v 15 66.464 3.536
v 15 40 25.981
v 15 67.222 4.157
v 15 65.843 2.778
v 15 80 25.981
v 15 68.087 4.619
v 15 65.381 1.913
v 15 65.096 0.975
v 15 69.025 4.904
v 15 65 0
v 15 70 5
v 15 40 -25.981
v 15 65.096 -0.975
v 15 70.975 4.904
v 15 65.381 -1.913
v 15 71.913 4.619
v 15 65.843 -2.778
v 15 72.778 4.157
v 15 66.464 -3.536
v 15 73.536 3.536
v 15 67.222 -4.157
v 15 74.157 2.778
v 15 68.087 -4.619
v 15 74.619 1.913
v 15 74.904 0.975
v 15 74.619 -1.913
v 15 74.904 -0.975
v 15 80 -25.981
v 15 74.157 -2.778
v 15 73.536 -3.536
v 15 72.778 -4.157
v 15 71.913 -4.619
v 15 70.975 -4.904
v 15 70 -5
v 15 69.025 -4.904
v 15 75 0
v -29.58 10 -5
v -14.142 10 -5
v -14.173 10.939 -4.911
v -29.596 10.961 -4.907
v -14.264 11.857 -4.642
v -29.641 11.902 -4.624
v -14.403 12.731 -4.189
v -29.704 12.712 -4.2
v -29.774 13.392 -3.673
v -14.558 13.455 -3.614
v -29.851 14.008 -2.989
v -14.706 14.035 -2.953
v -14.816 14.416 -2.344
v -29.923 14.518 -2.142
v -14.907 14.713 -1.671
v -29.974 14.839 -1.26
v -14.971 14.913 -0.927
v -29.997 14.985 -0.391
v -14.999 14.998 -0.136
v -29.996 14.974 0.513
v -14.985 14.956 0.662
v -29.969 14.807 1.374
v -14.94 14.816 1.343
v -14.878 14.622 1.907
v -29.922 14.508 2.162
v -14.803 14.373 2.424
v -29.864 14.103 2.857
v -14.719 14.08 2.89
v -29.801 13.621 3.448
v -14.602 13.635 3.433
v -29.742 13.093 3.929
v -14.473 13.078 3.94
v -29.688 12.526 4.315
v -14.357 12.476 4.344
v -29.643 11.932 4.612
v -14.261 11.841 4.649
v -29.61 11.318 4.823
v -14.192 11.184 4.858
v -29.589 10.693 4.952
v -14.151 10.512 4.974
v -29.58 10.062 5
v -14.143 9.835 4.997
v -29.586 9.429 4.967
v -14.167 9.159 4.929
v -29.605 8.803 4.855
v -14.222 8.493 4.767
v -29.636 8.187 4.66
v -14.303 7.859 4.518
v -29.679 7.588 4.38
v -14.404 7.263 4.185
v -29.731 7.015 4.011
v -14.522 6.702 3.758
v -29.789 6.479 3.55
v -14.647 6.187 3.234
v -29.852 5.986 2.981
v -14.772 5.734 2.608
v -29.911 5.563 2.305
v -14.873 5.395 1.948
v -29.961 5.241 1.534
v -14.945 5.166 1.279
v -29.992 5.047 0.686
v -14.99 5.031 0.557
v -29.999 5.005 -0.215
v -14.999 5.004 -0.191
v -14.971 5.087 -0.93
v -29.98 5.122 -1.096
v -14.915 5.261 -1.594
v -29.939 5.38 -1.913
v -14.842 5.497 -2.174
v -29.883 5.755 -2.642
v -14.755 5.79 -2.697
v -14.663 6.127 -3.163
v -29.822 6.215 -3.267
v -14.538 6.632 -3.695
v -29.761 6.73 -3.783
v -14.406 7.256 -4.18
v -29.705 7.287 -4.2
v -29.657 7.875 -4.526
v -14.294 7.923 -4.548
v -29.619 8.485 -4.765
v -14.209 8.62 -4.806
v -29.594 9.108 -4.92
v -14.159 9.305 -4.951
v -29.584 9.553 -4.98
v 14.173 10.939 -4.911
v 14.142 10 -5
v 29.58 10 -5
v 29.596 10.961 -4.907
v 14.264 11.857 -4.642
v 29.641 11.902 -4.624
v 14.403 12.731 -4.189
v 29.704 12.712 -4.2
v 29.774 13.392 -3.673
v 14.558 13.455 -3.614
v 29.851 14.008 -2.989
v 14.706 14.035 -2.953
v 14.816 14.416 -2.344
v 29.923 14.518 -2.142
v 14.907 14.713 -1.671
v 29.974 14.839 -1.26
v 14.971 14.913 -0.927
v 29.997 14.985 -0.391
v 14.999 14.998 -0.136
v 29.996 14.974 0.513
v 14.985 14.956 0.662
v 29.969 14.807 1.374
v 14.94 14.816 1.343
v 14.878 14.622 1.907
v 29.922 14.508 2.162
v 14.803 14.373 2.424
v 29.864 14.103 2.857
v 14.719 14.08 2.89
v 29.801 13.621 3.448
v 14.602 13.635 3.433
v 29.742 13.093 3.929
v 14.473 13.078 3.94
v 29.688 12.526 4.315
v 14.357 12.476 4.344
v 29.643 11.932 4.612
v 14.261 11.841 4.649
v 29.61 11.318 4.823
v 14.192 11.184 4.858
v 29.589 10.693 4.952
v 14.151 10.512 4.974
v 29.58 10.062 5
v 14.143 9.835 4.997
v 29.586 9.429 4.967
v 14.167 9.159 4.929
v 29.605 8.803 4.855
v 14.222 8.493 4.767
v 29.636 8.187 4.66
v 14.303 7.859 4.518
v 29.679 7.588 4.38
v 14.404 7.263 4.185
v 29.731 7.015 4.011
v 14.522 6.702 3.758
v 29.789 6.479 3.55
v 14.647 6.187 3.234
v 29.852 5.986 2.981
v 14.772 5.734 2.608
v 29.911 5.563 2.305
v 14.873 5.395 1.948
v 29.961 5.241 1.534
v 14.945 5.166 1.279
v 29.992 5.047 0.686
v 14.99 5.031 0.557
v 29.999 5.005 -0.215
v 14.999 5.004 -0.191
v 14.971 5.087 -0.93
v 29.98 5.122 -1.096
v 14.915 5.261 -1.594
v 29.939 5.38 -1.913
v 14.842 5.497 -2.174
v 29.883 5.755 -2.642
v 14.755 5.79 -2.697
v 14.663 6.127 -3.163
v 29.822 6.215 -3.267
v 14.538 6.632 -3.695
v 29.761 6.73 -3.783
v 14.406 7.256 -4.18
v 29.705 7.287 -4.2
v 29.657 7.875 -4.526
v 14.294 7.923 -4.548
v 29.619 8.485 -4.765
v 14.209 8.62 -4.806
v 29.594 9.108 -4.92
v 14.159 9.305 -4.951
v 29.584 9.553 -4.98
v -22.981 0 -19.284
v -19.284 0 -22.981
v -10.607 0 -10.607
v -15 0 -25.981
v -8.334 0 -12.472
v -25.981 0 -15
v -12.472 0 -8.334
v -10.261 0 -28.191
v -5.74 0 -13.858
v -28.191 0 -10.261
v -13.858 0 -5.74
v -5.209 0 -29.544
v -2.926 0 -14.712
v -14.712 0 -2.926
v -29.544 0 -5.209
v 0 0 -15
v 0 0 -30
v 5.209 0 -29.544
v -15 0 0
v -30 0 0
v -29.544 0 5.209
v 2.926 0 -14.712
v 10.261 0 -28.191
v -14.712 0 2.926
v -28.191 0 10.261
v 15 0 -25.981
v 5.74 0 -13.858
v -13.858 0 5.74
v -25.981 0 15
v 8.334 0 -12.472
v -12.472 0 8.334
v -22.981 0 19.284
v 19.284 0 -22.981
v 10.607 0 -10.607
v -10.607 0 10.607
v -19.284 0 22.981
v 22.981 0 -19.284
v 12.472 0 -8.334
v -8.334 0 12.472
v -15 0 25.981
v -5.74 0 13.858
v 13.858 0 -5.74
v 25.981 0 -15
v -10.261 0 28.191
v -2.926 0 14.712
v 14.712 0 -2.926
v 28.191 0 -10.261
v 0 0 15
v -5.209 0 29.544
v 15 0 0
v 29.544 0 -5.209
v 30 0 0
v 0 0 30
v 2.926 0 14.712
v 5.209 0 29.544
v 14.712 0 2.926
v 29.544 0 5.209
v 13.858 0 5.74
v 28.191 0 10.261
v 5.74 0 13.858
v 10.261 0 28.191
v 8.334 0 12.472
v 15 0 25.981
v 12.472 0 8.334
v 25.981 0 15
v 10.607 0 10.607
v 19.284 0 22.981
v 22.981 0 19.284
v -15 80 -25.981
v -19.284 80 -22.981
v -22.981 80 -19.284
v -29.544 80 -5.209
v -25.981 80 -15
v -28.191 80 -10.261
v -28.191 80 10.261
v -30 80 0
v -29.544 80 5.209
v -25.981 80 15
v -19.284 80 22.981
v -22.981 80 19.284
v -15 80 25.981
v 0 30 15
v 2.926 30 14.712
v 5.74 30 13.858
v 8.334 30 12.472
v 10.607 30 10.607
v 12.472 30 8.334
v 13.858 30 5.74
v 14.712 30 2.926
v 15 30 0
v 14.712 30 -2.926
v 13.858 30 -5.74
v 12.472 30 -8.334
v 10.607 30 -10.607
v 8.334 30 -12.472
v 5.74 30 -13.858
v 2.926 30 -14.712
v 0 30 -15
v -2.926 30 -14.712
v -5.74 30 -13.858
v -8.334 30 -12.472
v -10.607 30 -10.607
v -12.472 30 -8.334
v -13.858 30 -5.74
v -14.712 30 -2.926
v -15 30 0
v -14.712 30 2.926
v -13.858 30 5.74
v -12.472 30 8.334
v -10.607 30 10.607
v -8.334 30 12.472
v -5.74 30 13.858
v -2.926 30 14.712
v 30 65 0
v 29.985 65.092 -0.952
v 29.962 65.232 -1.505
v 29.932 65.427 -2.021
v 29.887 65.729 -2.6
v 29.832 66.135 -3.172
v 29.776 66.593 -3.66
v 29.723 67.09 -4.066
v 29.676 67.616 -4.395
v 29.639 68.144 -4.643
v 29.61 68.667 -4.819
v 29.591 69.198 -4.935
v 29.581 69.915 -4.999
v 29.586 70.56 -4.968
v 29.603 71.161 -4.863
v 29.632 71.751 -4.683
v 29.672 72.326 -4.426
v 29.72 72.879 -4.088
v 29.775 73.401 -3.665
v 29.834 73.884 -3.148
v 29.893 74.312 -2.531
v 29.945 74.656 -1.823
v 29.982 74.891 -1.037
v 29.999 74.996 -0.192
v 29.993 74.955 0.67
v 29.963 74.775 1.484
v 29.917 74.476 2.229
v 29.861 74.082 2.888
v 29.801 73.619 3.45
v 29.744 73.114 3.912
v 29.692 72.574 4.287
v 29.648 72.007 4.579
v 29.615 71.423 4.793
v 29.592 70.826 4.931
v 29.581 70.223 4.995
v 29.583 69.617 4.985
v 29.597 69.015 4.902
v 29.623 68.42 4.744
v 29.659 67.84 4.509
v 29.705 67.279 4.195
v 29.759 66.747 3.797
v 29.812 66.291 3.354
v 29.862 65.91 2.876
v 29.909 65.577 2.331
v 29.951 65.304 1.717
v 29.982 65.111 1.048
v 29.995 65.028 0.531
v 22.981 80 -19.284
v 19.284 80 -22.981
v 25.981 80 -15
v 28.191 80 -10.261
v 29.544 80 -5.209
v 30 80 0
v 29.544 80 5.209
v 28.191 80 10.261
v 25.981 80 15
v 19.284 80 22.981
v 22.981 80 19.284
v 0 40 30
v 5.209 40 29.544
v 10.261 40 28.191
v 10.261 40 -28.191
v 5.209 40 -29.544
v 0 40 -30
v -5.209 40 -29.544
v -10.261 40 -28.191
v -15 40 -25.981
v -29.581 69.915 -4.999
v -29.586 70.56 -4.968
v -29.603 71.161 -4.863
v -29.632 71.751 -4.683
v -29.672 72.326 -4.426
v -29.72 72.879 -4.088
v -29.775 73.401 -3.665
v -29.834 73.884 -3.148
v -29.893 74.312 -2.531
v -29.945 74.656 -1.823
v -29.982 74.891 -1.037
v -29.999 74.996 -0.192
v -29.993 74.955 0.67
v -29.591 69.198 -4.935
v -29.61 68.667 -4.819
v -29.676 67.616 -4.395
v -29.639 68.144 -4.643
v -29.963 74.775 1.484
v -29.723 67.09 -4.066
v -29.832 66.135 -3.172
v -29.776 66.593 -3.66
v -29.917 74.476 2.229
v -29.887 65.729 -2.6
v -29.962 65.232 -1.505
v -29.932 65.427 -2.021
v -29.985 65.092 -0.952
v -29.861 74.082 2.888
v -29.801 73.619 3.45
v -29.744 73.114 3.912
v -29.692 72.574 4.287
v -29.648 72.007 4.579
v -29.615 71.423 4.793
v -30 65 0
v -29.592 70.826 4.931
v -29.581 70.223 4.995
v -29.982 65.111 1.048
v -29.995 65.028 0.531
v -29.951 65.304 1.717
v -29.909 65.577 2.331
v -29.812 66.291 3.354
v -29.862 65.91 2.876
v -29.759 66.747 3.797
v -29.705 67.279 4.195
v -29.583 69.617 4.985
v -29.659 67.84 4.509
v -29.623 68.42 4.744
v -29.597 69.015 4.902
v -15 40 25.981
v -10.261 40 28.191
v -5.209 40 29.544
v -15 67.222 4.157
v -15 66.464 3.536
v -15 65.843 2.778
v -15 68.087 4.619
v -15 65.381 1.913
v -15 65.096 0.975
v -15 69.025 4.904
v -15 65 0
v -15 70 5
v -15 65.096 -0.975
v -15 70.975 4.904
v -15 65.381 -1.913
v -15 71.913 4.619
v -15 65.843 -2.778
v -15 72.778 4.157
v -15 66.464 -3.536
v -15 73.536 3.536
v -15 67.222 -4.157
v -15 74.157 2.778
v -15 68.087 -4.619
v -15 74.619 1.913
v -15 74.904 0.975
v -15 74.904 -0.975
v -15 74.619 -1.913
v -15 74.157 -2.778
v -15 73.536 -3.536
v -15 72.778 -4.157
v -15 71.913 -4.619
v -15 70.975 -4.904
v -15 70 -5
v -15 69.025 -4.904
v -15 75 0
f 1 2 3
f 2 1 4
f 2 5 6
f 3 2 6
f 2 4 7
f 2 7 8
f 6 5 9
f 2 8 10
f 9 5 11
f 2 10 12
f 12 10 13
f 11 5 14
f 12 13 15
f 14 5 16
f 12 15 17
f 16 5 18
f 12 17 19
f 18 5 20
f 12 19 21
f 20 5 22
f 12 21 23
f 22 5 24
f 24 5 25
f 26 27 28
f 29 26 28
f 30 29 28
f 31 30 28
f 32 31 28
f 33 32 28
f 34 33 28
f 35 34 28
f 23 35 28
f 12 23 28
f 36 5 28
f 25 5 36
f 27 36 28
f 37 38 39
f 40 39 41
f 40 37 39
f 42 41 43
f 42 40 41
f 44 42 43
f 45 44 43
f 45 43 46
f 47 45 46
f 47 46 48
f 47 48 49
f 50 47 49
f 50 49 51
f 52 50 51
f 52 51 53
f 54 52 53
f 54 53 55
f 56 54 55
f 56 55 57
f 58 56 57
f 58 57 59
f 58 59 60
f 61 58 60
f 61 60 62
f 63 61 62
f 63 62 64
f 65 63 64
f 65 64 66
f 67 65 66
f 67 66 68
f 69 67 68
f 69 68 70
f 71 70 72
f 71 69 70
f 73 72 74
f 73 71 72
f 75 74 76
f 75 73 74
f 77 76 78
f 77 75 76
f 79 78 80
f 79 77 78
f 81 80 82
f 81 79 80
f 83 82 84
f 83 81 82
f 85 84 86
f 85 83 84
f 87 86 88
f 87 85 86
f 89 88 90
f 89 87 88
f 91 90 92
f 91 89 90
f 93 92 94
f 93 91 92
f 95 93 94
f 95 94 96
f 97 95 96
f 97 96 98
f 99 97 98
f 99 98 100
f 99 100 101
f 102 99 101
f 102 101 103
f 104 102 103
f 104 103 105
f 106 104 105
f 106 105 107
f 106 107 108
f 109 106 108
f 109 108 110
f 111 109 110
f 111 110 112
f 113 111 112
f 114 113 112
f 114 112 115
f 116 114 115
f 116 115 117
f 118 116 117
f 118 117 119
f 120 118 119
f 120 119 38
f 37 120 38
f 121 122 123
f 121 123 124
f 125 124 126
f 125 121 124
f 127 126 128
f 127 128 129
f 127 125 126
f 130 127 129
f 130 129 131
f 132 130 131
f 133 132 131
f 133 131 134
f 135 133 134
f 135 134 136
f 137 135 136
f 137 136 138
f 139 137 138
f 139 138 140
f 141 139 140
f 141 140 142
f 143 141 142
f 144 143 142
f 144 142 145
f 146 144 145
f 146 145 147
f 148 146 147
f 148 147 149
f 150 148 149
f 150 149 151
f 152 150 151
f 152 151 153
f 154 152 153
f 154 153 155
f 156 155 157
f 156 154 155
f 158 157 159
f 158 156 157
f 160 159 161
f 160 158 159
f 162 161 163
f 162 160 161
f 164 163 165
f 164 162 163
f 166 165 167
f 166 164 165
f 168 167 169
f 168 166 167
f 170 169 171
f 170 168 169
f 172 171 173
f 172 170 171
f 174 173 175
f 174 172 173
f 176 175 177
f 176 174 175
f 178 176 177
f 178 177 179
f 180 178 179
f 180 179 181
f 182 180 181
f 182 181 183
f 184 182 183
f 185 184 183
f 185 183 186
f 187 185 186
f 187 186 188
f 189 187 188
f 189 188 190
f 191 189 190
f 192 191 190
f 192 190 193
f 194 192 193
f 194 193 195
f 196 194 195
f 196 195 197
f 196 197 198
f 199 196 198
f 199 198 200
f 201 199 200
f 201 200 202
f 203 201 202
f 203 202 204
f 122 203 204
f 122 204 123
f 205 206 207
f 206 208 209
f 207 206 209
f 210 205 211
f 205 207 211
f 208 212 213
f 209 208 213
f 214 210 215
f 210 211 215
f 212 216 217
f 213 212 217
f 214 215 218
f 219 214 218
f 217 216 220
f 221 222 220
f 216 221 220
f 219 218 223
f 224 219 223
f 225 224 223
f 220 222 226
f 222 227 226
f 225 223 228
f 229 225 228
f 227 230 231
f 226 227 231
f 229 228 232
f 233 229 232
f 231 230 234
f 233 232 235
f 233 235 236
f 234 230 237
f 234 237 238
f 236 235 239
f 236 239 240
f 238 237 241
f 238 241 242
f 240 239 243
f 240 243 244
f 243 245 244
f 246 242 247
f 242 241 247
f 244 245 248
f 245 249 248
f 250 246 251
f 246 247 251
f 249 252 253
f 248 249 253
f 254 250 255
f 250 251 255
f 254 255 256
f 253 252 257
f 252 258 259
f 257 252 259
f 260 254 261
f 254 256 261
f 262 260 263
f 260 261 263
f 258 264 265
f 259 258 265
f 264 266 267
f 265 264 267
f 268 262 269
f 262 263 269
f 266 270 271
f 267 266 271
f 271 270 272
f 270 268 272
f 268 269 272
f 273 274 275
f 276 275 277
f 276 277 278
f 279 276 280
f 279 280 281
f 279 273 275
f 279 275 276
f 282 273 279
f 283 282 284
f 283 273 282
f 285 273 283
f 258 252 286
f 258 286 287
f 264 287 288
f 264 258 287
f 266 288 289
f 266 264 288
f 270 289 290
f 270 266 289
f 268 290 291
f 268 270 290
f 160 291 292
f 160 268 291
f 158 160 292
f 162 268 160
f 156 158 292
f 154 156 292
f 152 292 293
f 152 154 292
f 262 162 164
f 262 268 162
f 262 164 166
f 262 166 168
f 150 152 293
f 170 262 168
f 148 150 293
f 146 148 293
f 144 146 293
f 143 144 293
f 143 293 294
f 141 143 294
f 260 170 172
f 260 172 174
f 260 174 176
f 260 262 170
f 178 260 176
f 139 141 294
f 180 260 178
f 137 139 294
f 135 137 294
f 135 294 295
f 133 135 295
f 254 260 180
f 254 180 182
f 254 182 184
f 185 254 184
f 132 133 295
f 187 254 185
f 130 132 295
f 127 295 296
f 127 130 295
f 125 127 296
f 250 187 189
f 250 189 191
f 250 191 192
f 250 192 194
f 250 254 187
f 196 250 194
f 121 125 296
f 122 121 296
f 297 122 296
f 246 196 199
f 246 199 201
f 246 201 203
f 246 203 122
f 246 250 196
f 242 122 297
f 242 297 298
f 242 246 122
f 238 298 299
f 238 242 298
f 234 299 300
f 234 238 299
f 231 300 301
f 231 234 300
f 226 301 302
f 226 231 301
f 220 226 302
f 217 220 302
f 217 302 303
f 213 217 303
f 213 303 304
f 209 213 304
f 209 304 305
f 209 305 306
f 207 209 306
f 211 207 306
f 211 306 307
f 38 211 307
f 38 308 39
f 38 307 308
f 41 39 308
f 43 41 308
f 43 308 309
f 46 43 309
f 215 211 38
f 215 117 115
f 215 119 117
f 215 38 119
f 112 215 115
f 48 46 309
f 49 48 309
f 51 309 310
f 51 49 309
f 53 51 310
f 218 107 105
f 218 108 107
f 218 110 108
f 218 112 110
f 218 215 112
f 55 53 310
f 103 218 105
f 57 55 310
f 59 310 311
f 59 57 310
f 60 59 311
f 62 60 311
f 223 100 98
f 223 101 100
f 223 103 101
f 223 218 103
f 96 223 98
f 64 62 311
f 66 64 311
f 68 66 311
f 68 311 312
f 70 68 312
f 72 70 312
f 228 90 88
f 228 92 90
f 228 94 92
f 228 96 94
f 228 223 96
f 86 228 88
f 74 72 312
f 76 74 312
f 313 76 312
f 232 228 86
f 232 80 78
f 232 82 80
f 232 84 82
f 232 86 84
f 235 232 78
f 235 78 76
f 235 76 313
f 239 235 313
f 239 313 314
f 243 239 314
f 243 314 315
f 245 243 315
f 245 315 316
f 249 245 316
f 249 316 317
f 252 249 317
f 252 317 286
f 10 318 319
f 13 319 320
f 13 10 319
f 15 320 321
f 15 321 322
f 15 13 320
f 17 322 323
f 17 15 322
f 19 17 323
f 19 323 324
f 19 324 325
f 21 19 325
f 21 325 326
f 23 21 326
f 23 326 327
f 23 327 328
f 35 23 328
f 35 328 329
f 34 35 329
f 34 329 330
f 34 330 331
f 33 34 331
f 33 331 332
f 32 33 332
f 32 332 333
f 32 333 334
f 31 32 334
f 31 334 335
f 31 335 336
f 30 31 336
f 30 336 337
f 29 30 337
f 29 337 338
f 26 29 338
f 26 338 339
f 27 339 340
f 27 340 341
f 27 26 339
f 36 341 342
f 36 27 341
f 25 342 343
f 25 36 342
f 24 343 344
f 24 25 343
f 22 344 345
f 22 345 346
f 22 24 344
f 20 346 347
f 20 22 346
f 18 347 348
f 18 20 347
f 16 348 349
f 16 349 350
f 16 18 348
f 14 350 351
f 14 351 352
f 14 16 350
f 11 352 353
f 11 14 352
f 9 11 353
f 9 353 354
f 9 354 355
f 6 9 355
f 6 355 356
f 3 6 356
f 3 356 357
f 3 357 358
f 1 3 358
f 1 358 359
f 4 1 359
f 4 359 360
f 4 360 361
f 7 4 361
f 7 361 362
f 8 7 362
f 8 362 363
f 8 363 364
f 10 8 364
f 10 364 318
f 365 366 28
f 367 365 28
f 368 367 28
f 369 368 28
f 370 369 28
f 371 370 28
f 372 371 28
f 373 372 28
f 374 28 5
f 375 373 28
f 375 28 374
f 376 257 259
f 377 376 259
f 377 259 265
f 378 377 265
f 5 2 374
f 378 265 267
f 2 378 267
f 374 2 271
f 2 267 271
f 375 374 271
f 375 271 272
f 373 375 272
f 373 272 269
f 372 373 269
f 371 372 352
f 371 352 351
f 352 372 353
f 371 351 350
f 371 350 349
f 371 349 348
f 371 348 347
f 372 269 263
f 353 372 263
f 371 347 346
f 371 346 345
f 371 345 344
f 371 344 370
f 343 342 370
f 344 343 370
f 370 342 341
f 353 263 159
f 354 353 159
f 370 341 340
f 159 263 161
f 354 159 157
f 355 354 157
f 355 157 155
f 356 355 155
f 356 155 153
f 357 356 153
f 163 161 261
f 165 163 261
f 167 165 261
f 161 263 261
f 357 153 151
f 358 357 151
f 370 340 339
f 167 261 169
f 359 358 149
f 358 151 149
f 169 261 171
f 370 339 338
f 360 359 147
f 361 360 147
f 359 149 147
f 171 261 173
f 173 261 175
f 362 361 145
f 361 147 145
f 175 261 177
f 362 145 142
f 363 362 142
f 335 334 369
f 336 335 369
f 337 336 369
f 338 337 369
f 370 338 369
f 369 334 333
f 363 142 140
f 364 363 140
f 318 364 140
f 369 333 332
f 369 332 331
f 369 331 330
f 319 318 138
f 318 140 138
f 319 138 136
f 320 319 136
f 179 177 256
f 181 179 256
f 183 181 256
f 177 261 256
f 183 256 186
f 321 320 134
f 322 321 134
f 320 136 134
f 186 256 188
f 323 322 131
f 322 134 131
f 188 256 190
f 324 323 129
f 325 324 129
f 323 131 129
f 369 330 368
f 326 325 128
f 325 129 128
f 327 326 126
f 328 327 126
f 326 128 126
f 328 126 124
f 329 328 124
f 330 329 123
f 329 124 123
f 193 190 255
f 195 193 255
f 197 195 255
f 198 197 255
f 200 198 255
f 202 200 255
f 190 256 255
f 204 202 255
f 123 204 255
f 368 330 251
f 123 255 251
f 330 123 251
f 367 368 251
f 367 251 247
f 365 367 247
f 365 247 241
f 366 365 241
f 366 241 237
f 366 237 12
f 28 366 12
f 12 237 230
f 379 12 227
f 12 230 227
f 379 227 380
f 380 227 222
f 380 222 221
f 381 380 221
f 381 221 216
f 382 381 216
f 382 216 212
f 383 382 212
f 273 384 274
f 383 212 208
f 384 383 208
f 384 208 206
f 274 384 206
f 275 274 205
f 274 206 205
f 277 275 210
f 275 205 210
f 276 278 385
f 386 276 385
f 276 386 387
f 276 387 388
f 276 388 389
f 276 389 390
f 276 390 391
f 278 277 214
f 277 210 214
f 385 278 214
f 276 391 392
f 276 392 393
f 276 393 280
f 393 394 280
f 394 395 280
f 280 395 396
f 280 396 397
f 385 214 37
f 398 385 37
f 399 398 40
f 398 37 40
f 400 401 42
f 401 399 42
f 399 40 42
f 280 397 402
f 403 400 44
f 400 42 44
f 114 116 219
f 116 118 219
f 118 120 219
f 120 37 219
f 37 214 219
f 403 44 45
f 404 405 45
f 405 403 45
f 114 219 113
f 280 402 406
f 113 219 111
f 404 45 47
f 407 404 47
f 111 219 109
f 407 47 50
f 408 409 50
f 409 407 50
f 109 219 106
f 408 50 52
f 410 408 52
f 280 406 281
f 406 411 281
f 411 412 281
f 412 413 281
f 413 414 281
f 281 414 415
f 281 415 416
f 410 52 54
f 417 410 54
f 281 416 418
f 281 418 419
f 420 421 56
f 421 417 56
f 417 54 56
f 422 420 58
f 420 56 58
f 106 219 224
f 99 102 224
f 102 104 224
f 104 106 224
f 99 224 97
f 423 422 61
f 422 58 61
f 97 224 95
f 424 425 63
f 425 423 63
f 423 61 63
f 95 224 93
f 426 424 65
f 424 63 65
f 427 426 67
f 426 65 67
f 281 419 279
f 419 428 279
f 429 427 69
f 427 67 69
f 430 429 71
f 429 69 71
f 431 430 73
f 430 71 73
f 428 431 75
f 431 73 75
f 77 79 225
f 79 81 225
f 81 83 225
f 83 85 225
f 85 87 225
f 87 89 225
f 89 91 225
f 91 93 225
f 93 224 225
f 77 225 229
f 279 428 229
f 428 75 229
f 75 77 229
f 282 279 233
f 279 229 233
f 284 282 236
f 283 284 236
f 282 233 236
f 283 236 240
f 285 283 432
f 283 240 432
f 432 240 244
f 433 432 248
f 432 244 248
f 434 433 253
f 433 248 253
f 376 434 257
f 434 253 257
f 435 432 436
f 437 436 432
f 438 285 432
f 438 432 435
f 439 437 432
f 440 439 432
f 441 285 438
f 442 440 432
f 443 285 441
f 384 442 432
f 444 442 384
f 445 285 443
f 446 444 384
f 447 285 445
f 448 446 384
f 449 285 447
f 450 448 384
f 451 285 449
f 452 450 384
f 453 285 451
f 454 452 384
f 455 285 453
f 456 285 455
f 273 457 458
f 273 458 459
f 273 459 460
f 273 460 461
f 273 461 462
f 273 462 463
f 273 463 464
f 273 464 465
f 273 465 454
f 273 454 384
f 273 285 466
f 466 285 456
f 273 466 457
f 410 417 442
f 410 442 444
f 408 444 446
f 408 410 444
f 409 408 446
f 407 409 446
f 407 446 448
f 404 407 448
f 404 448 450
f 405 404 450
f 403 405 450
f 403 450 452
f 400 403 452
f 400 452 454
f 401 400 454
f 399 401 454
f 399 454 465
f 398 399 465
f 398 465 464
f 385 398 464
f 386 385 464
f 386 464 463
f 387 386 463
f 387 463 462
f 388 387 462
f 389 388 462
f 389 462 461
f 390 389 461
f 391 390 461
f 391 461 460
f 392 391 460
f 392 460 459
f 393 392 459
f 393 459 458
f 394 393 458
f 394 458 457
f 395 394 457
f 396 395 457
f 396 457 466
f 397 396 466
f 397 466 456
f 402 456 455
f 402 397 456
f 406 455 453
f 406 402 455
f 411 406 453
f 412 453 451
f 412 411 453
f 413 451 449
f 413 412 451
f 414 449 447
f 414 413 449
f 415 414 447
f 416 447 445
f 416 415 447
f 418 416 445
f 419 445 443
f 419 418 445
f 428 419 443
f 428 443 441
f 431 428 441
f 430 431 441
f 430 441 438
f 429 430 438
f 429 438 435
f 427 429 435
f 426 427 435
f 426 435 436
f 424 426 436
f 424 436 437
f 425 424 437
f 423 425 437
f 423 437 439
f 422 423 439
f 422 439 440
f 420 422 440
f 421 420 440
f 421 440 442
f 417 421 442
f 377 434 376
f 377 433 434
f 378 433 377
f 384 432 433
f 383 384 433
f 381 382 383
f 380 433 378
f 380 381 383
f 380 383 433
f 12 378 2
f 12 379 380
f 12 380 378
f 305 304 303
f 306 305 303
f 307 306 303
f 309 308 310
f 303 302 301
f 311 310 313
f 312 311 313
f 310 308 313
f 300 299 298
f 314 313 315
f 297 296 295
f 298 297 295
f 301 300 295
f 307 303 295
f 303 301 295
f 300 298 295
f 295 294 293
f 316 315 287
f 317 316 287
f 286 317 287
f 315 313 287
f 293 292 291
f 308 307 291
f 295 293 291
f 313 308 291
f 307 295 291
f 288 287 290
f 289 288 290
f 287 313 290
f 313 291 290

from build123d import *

# Parameters (mm, degrees)
SKETCH1_R               = 30
SKETCH1_R_2             = 15
BOSS_EXTRUDE1_DEPTH     = 80
SKETCH2_W               = 30
SKETCH2_H               = 60
CUT_EXTRUDE1_DEPTH      = 40
CUT_EXTRUDE2_DEPTH      = 97.566039579
CUT_EXTRUDE2_DEPTH_BACK = 97.566039579
SKETCH3_R               = 5
BOSS_EXTRUDE2_START     = -10
SKETCH4_R               = 15
BOSS_EXTRUDE2_DEPTH     = 10
CUT_EXTRUDE3_DEPTH      = 91.553851536
CUT_EXTRUDE3_DEPTH_BACK = 91.553851536
SKETCH5_R               = 5


with BuildPart() as part:
    # Sketch1 → Boss-Extrude1 (new body)
    with BuildSketch(Plane(origin=(0, 0, 0), x_dir=(1, 0, 0), z_dir=(0, 1, 0))):
        with Locations(Location((0, 0, 0), (0, 0, 270))):
            Circle(SKETCH1_R)
        with Locations(Location((0, 0, 0), (0, 0, 270))):
            Circle(SKETCH1_R_2, mode=Mode.SUBTRACT)
    extrude(amount=BOSS_EXTRUDE1_DEPTH)

    # Sketch2 → Cut-Extrude1 (cut)
    with BuildSketch(Plane(origin=(0, 80, 0), x_dir=(1, 0, 0), z_dir=(0, 1, 0))):
        Rectangle(SKETCH2_W, SKETCH2_H)
    extrude(amount=-CUT_EXTRUDE1_DEPTH, mode=Mode.SUBTRACT)

    # Sketch3 → Cut-Extrude2 (cut, two sides: drawn at the far end of the back side and taken through both)
    with BuildSketch(Plane(origin=(-15, 0, 0), x_dir=(0, 0, -1), z_dir=(1, 0, 0)).offset(-CUT_EXTRUDE2_DEPTH_BACK)):
        with Locations(Location((0, 70, 0), (0, 0, 270))):
            Circle(SKETCH3_R)
    extrude(amount=CUT_EXTRUDE2_DEPTH + CUT_EXTRUDE2_DEPTH_BACK, mode=Mode.SUBTRACT)

    # Sketch4 → Boss-Extrude2 (add)
    with BuildSketch(Plane(origin=(0, 40, 0), x_dir=(1, 0, 0), z_dir=(0, 1, 0)).offset(BOSS_EXTRUDE2_START)):
        with Locations(Location((0, 0, 0), (0, 0, 270))):
            Circle(SKETCH4_R)
    extrude(amount=BOSS_EXTRUDE2_DEPTH)

    # Sketch5 → Cut-Extrude3 (cut, two sides: drawn at the far end of the back side and taken through both)
    with BuildSketch(Plane(origin=(0, 0, 0), x_dir=(0, 0, -1), z_dir=(1, 0, 0)).offset(-CUT_EXTRUDE3_DEPTH_BACK)):
        with Locations((0, 10)):
            Circle(SKETCH5_R)
    extrude(amount=CUT_EXTRUDE3_DEPTH + CUT_EXTRUDE3_DEPTH_BACK, mode=Mode.SUBTRACT)


solid = part.part
